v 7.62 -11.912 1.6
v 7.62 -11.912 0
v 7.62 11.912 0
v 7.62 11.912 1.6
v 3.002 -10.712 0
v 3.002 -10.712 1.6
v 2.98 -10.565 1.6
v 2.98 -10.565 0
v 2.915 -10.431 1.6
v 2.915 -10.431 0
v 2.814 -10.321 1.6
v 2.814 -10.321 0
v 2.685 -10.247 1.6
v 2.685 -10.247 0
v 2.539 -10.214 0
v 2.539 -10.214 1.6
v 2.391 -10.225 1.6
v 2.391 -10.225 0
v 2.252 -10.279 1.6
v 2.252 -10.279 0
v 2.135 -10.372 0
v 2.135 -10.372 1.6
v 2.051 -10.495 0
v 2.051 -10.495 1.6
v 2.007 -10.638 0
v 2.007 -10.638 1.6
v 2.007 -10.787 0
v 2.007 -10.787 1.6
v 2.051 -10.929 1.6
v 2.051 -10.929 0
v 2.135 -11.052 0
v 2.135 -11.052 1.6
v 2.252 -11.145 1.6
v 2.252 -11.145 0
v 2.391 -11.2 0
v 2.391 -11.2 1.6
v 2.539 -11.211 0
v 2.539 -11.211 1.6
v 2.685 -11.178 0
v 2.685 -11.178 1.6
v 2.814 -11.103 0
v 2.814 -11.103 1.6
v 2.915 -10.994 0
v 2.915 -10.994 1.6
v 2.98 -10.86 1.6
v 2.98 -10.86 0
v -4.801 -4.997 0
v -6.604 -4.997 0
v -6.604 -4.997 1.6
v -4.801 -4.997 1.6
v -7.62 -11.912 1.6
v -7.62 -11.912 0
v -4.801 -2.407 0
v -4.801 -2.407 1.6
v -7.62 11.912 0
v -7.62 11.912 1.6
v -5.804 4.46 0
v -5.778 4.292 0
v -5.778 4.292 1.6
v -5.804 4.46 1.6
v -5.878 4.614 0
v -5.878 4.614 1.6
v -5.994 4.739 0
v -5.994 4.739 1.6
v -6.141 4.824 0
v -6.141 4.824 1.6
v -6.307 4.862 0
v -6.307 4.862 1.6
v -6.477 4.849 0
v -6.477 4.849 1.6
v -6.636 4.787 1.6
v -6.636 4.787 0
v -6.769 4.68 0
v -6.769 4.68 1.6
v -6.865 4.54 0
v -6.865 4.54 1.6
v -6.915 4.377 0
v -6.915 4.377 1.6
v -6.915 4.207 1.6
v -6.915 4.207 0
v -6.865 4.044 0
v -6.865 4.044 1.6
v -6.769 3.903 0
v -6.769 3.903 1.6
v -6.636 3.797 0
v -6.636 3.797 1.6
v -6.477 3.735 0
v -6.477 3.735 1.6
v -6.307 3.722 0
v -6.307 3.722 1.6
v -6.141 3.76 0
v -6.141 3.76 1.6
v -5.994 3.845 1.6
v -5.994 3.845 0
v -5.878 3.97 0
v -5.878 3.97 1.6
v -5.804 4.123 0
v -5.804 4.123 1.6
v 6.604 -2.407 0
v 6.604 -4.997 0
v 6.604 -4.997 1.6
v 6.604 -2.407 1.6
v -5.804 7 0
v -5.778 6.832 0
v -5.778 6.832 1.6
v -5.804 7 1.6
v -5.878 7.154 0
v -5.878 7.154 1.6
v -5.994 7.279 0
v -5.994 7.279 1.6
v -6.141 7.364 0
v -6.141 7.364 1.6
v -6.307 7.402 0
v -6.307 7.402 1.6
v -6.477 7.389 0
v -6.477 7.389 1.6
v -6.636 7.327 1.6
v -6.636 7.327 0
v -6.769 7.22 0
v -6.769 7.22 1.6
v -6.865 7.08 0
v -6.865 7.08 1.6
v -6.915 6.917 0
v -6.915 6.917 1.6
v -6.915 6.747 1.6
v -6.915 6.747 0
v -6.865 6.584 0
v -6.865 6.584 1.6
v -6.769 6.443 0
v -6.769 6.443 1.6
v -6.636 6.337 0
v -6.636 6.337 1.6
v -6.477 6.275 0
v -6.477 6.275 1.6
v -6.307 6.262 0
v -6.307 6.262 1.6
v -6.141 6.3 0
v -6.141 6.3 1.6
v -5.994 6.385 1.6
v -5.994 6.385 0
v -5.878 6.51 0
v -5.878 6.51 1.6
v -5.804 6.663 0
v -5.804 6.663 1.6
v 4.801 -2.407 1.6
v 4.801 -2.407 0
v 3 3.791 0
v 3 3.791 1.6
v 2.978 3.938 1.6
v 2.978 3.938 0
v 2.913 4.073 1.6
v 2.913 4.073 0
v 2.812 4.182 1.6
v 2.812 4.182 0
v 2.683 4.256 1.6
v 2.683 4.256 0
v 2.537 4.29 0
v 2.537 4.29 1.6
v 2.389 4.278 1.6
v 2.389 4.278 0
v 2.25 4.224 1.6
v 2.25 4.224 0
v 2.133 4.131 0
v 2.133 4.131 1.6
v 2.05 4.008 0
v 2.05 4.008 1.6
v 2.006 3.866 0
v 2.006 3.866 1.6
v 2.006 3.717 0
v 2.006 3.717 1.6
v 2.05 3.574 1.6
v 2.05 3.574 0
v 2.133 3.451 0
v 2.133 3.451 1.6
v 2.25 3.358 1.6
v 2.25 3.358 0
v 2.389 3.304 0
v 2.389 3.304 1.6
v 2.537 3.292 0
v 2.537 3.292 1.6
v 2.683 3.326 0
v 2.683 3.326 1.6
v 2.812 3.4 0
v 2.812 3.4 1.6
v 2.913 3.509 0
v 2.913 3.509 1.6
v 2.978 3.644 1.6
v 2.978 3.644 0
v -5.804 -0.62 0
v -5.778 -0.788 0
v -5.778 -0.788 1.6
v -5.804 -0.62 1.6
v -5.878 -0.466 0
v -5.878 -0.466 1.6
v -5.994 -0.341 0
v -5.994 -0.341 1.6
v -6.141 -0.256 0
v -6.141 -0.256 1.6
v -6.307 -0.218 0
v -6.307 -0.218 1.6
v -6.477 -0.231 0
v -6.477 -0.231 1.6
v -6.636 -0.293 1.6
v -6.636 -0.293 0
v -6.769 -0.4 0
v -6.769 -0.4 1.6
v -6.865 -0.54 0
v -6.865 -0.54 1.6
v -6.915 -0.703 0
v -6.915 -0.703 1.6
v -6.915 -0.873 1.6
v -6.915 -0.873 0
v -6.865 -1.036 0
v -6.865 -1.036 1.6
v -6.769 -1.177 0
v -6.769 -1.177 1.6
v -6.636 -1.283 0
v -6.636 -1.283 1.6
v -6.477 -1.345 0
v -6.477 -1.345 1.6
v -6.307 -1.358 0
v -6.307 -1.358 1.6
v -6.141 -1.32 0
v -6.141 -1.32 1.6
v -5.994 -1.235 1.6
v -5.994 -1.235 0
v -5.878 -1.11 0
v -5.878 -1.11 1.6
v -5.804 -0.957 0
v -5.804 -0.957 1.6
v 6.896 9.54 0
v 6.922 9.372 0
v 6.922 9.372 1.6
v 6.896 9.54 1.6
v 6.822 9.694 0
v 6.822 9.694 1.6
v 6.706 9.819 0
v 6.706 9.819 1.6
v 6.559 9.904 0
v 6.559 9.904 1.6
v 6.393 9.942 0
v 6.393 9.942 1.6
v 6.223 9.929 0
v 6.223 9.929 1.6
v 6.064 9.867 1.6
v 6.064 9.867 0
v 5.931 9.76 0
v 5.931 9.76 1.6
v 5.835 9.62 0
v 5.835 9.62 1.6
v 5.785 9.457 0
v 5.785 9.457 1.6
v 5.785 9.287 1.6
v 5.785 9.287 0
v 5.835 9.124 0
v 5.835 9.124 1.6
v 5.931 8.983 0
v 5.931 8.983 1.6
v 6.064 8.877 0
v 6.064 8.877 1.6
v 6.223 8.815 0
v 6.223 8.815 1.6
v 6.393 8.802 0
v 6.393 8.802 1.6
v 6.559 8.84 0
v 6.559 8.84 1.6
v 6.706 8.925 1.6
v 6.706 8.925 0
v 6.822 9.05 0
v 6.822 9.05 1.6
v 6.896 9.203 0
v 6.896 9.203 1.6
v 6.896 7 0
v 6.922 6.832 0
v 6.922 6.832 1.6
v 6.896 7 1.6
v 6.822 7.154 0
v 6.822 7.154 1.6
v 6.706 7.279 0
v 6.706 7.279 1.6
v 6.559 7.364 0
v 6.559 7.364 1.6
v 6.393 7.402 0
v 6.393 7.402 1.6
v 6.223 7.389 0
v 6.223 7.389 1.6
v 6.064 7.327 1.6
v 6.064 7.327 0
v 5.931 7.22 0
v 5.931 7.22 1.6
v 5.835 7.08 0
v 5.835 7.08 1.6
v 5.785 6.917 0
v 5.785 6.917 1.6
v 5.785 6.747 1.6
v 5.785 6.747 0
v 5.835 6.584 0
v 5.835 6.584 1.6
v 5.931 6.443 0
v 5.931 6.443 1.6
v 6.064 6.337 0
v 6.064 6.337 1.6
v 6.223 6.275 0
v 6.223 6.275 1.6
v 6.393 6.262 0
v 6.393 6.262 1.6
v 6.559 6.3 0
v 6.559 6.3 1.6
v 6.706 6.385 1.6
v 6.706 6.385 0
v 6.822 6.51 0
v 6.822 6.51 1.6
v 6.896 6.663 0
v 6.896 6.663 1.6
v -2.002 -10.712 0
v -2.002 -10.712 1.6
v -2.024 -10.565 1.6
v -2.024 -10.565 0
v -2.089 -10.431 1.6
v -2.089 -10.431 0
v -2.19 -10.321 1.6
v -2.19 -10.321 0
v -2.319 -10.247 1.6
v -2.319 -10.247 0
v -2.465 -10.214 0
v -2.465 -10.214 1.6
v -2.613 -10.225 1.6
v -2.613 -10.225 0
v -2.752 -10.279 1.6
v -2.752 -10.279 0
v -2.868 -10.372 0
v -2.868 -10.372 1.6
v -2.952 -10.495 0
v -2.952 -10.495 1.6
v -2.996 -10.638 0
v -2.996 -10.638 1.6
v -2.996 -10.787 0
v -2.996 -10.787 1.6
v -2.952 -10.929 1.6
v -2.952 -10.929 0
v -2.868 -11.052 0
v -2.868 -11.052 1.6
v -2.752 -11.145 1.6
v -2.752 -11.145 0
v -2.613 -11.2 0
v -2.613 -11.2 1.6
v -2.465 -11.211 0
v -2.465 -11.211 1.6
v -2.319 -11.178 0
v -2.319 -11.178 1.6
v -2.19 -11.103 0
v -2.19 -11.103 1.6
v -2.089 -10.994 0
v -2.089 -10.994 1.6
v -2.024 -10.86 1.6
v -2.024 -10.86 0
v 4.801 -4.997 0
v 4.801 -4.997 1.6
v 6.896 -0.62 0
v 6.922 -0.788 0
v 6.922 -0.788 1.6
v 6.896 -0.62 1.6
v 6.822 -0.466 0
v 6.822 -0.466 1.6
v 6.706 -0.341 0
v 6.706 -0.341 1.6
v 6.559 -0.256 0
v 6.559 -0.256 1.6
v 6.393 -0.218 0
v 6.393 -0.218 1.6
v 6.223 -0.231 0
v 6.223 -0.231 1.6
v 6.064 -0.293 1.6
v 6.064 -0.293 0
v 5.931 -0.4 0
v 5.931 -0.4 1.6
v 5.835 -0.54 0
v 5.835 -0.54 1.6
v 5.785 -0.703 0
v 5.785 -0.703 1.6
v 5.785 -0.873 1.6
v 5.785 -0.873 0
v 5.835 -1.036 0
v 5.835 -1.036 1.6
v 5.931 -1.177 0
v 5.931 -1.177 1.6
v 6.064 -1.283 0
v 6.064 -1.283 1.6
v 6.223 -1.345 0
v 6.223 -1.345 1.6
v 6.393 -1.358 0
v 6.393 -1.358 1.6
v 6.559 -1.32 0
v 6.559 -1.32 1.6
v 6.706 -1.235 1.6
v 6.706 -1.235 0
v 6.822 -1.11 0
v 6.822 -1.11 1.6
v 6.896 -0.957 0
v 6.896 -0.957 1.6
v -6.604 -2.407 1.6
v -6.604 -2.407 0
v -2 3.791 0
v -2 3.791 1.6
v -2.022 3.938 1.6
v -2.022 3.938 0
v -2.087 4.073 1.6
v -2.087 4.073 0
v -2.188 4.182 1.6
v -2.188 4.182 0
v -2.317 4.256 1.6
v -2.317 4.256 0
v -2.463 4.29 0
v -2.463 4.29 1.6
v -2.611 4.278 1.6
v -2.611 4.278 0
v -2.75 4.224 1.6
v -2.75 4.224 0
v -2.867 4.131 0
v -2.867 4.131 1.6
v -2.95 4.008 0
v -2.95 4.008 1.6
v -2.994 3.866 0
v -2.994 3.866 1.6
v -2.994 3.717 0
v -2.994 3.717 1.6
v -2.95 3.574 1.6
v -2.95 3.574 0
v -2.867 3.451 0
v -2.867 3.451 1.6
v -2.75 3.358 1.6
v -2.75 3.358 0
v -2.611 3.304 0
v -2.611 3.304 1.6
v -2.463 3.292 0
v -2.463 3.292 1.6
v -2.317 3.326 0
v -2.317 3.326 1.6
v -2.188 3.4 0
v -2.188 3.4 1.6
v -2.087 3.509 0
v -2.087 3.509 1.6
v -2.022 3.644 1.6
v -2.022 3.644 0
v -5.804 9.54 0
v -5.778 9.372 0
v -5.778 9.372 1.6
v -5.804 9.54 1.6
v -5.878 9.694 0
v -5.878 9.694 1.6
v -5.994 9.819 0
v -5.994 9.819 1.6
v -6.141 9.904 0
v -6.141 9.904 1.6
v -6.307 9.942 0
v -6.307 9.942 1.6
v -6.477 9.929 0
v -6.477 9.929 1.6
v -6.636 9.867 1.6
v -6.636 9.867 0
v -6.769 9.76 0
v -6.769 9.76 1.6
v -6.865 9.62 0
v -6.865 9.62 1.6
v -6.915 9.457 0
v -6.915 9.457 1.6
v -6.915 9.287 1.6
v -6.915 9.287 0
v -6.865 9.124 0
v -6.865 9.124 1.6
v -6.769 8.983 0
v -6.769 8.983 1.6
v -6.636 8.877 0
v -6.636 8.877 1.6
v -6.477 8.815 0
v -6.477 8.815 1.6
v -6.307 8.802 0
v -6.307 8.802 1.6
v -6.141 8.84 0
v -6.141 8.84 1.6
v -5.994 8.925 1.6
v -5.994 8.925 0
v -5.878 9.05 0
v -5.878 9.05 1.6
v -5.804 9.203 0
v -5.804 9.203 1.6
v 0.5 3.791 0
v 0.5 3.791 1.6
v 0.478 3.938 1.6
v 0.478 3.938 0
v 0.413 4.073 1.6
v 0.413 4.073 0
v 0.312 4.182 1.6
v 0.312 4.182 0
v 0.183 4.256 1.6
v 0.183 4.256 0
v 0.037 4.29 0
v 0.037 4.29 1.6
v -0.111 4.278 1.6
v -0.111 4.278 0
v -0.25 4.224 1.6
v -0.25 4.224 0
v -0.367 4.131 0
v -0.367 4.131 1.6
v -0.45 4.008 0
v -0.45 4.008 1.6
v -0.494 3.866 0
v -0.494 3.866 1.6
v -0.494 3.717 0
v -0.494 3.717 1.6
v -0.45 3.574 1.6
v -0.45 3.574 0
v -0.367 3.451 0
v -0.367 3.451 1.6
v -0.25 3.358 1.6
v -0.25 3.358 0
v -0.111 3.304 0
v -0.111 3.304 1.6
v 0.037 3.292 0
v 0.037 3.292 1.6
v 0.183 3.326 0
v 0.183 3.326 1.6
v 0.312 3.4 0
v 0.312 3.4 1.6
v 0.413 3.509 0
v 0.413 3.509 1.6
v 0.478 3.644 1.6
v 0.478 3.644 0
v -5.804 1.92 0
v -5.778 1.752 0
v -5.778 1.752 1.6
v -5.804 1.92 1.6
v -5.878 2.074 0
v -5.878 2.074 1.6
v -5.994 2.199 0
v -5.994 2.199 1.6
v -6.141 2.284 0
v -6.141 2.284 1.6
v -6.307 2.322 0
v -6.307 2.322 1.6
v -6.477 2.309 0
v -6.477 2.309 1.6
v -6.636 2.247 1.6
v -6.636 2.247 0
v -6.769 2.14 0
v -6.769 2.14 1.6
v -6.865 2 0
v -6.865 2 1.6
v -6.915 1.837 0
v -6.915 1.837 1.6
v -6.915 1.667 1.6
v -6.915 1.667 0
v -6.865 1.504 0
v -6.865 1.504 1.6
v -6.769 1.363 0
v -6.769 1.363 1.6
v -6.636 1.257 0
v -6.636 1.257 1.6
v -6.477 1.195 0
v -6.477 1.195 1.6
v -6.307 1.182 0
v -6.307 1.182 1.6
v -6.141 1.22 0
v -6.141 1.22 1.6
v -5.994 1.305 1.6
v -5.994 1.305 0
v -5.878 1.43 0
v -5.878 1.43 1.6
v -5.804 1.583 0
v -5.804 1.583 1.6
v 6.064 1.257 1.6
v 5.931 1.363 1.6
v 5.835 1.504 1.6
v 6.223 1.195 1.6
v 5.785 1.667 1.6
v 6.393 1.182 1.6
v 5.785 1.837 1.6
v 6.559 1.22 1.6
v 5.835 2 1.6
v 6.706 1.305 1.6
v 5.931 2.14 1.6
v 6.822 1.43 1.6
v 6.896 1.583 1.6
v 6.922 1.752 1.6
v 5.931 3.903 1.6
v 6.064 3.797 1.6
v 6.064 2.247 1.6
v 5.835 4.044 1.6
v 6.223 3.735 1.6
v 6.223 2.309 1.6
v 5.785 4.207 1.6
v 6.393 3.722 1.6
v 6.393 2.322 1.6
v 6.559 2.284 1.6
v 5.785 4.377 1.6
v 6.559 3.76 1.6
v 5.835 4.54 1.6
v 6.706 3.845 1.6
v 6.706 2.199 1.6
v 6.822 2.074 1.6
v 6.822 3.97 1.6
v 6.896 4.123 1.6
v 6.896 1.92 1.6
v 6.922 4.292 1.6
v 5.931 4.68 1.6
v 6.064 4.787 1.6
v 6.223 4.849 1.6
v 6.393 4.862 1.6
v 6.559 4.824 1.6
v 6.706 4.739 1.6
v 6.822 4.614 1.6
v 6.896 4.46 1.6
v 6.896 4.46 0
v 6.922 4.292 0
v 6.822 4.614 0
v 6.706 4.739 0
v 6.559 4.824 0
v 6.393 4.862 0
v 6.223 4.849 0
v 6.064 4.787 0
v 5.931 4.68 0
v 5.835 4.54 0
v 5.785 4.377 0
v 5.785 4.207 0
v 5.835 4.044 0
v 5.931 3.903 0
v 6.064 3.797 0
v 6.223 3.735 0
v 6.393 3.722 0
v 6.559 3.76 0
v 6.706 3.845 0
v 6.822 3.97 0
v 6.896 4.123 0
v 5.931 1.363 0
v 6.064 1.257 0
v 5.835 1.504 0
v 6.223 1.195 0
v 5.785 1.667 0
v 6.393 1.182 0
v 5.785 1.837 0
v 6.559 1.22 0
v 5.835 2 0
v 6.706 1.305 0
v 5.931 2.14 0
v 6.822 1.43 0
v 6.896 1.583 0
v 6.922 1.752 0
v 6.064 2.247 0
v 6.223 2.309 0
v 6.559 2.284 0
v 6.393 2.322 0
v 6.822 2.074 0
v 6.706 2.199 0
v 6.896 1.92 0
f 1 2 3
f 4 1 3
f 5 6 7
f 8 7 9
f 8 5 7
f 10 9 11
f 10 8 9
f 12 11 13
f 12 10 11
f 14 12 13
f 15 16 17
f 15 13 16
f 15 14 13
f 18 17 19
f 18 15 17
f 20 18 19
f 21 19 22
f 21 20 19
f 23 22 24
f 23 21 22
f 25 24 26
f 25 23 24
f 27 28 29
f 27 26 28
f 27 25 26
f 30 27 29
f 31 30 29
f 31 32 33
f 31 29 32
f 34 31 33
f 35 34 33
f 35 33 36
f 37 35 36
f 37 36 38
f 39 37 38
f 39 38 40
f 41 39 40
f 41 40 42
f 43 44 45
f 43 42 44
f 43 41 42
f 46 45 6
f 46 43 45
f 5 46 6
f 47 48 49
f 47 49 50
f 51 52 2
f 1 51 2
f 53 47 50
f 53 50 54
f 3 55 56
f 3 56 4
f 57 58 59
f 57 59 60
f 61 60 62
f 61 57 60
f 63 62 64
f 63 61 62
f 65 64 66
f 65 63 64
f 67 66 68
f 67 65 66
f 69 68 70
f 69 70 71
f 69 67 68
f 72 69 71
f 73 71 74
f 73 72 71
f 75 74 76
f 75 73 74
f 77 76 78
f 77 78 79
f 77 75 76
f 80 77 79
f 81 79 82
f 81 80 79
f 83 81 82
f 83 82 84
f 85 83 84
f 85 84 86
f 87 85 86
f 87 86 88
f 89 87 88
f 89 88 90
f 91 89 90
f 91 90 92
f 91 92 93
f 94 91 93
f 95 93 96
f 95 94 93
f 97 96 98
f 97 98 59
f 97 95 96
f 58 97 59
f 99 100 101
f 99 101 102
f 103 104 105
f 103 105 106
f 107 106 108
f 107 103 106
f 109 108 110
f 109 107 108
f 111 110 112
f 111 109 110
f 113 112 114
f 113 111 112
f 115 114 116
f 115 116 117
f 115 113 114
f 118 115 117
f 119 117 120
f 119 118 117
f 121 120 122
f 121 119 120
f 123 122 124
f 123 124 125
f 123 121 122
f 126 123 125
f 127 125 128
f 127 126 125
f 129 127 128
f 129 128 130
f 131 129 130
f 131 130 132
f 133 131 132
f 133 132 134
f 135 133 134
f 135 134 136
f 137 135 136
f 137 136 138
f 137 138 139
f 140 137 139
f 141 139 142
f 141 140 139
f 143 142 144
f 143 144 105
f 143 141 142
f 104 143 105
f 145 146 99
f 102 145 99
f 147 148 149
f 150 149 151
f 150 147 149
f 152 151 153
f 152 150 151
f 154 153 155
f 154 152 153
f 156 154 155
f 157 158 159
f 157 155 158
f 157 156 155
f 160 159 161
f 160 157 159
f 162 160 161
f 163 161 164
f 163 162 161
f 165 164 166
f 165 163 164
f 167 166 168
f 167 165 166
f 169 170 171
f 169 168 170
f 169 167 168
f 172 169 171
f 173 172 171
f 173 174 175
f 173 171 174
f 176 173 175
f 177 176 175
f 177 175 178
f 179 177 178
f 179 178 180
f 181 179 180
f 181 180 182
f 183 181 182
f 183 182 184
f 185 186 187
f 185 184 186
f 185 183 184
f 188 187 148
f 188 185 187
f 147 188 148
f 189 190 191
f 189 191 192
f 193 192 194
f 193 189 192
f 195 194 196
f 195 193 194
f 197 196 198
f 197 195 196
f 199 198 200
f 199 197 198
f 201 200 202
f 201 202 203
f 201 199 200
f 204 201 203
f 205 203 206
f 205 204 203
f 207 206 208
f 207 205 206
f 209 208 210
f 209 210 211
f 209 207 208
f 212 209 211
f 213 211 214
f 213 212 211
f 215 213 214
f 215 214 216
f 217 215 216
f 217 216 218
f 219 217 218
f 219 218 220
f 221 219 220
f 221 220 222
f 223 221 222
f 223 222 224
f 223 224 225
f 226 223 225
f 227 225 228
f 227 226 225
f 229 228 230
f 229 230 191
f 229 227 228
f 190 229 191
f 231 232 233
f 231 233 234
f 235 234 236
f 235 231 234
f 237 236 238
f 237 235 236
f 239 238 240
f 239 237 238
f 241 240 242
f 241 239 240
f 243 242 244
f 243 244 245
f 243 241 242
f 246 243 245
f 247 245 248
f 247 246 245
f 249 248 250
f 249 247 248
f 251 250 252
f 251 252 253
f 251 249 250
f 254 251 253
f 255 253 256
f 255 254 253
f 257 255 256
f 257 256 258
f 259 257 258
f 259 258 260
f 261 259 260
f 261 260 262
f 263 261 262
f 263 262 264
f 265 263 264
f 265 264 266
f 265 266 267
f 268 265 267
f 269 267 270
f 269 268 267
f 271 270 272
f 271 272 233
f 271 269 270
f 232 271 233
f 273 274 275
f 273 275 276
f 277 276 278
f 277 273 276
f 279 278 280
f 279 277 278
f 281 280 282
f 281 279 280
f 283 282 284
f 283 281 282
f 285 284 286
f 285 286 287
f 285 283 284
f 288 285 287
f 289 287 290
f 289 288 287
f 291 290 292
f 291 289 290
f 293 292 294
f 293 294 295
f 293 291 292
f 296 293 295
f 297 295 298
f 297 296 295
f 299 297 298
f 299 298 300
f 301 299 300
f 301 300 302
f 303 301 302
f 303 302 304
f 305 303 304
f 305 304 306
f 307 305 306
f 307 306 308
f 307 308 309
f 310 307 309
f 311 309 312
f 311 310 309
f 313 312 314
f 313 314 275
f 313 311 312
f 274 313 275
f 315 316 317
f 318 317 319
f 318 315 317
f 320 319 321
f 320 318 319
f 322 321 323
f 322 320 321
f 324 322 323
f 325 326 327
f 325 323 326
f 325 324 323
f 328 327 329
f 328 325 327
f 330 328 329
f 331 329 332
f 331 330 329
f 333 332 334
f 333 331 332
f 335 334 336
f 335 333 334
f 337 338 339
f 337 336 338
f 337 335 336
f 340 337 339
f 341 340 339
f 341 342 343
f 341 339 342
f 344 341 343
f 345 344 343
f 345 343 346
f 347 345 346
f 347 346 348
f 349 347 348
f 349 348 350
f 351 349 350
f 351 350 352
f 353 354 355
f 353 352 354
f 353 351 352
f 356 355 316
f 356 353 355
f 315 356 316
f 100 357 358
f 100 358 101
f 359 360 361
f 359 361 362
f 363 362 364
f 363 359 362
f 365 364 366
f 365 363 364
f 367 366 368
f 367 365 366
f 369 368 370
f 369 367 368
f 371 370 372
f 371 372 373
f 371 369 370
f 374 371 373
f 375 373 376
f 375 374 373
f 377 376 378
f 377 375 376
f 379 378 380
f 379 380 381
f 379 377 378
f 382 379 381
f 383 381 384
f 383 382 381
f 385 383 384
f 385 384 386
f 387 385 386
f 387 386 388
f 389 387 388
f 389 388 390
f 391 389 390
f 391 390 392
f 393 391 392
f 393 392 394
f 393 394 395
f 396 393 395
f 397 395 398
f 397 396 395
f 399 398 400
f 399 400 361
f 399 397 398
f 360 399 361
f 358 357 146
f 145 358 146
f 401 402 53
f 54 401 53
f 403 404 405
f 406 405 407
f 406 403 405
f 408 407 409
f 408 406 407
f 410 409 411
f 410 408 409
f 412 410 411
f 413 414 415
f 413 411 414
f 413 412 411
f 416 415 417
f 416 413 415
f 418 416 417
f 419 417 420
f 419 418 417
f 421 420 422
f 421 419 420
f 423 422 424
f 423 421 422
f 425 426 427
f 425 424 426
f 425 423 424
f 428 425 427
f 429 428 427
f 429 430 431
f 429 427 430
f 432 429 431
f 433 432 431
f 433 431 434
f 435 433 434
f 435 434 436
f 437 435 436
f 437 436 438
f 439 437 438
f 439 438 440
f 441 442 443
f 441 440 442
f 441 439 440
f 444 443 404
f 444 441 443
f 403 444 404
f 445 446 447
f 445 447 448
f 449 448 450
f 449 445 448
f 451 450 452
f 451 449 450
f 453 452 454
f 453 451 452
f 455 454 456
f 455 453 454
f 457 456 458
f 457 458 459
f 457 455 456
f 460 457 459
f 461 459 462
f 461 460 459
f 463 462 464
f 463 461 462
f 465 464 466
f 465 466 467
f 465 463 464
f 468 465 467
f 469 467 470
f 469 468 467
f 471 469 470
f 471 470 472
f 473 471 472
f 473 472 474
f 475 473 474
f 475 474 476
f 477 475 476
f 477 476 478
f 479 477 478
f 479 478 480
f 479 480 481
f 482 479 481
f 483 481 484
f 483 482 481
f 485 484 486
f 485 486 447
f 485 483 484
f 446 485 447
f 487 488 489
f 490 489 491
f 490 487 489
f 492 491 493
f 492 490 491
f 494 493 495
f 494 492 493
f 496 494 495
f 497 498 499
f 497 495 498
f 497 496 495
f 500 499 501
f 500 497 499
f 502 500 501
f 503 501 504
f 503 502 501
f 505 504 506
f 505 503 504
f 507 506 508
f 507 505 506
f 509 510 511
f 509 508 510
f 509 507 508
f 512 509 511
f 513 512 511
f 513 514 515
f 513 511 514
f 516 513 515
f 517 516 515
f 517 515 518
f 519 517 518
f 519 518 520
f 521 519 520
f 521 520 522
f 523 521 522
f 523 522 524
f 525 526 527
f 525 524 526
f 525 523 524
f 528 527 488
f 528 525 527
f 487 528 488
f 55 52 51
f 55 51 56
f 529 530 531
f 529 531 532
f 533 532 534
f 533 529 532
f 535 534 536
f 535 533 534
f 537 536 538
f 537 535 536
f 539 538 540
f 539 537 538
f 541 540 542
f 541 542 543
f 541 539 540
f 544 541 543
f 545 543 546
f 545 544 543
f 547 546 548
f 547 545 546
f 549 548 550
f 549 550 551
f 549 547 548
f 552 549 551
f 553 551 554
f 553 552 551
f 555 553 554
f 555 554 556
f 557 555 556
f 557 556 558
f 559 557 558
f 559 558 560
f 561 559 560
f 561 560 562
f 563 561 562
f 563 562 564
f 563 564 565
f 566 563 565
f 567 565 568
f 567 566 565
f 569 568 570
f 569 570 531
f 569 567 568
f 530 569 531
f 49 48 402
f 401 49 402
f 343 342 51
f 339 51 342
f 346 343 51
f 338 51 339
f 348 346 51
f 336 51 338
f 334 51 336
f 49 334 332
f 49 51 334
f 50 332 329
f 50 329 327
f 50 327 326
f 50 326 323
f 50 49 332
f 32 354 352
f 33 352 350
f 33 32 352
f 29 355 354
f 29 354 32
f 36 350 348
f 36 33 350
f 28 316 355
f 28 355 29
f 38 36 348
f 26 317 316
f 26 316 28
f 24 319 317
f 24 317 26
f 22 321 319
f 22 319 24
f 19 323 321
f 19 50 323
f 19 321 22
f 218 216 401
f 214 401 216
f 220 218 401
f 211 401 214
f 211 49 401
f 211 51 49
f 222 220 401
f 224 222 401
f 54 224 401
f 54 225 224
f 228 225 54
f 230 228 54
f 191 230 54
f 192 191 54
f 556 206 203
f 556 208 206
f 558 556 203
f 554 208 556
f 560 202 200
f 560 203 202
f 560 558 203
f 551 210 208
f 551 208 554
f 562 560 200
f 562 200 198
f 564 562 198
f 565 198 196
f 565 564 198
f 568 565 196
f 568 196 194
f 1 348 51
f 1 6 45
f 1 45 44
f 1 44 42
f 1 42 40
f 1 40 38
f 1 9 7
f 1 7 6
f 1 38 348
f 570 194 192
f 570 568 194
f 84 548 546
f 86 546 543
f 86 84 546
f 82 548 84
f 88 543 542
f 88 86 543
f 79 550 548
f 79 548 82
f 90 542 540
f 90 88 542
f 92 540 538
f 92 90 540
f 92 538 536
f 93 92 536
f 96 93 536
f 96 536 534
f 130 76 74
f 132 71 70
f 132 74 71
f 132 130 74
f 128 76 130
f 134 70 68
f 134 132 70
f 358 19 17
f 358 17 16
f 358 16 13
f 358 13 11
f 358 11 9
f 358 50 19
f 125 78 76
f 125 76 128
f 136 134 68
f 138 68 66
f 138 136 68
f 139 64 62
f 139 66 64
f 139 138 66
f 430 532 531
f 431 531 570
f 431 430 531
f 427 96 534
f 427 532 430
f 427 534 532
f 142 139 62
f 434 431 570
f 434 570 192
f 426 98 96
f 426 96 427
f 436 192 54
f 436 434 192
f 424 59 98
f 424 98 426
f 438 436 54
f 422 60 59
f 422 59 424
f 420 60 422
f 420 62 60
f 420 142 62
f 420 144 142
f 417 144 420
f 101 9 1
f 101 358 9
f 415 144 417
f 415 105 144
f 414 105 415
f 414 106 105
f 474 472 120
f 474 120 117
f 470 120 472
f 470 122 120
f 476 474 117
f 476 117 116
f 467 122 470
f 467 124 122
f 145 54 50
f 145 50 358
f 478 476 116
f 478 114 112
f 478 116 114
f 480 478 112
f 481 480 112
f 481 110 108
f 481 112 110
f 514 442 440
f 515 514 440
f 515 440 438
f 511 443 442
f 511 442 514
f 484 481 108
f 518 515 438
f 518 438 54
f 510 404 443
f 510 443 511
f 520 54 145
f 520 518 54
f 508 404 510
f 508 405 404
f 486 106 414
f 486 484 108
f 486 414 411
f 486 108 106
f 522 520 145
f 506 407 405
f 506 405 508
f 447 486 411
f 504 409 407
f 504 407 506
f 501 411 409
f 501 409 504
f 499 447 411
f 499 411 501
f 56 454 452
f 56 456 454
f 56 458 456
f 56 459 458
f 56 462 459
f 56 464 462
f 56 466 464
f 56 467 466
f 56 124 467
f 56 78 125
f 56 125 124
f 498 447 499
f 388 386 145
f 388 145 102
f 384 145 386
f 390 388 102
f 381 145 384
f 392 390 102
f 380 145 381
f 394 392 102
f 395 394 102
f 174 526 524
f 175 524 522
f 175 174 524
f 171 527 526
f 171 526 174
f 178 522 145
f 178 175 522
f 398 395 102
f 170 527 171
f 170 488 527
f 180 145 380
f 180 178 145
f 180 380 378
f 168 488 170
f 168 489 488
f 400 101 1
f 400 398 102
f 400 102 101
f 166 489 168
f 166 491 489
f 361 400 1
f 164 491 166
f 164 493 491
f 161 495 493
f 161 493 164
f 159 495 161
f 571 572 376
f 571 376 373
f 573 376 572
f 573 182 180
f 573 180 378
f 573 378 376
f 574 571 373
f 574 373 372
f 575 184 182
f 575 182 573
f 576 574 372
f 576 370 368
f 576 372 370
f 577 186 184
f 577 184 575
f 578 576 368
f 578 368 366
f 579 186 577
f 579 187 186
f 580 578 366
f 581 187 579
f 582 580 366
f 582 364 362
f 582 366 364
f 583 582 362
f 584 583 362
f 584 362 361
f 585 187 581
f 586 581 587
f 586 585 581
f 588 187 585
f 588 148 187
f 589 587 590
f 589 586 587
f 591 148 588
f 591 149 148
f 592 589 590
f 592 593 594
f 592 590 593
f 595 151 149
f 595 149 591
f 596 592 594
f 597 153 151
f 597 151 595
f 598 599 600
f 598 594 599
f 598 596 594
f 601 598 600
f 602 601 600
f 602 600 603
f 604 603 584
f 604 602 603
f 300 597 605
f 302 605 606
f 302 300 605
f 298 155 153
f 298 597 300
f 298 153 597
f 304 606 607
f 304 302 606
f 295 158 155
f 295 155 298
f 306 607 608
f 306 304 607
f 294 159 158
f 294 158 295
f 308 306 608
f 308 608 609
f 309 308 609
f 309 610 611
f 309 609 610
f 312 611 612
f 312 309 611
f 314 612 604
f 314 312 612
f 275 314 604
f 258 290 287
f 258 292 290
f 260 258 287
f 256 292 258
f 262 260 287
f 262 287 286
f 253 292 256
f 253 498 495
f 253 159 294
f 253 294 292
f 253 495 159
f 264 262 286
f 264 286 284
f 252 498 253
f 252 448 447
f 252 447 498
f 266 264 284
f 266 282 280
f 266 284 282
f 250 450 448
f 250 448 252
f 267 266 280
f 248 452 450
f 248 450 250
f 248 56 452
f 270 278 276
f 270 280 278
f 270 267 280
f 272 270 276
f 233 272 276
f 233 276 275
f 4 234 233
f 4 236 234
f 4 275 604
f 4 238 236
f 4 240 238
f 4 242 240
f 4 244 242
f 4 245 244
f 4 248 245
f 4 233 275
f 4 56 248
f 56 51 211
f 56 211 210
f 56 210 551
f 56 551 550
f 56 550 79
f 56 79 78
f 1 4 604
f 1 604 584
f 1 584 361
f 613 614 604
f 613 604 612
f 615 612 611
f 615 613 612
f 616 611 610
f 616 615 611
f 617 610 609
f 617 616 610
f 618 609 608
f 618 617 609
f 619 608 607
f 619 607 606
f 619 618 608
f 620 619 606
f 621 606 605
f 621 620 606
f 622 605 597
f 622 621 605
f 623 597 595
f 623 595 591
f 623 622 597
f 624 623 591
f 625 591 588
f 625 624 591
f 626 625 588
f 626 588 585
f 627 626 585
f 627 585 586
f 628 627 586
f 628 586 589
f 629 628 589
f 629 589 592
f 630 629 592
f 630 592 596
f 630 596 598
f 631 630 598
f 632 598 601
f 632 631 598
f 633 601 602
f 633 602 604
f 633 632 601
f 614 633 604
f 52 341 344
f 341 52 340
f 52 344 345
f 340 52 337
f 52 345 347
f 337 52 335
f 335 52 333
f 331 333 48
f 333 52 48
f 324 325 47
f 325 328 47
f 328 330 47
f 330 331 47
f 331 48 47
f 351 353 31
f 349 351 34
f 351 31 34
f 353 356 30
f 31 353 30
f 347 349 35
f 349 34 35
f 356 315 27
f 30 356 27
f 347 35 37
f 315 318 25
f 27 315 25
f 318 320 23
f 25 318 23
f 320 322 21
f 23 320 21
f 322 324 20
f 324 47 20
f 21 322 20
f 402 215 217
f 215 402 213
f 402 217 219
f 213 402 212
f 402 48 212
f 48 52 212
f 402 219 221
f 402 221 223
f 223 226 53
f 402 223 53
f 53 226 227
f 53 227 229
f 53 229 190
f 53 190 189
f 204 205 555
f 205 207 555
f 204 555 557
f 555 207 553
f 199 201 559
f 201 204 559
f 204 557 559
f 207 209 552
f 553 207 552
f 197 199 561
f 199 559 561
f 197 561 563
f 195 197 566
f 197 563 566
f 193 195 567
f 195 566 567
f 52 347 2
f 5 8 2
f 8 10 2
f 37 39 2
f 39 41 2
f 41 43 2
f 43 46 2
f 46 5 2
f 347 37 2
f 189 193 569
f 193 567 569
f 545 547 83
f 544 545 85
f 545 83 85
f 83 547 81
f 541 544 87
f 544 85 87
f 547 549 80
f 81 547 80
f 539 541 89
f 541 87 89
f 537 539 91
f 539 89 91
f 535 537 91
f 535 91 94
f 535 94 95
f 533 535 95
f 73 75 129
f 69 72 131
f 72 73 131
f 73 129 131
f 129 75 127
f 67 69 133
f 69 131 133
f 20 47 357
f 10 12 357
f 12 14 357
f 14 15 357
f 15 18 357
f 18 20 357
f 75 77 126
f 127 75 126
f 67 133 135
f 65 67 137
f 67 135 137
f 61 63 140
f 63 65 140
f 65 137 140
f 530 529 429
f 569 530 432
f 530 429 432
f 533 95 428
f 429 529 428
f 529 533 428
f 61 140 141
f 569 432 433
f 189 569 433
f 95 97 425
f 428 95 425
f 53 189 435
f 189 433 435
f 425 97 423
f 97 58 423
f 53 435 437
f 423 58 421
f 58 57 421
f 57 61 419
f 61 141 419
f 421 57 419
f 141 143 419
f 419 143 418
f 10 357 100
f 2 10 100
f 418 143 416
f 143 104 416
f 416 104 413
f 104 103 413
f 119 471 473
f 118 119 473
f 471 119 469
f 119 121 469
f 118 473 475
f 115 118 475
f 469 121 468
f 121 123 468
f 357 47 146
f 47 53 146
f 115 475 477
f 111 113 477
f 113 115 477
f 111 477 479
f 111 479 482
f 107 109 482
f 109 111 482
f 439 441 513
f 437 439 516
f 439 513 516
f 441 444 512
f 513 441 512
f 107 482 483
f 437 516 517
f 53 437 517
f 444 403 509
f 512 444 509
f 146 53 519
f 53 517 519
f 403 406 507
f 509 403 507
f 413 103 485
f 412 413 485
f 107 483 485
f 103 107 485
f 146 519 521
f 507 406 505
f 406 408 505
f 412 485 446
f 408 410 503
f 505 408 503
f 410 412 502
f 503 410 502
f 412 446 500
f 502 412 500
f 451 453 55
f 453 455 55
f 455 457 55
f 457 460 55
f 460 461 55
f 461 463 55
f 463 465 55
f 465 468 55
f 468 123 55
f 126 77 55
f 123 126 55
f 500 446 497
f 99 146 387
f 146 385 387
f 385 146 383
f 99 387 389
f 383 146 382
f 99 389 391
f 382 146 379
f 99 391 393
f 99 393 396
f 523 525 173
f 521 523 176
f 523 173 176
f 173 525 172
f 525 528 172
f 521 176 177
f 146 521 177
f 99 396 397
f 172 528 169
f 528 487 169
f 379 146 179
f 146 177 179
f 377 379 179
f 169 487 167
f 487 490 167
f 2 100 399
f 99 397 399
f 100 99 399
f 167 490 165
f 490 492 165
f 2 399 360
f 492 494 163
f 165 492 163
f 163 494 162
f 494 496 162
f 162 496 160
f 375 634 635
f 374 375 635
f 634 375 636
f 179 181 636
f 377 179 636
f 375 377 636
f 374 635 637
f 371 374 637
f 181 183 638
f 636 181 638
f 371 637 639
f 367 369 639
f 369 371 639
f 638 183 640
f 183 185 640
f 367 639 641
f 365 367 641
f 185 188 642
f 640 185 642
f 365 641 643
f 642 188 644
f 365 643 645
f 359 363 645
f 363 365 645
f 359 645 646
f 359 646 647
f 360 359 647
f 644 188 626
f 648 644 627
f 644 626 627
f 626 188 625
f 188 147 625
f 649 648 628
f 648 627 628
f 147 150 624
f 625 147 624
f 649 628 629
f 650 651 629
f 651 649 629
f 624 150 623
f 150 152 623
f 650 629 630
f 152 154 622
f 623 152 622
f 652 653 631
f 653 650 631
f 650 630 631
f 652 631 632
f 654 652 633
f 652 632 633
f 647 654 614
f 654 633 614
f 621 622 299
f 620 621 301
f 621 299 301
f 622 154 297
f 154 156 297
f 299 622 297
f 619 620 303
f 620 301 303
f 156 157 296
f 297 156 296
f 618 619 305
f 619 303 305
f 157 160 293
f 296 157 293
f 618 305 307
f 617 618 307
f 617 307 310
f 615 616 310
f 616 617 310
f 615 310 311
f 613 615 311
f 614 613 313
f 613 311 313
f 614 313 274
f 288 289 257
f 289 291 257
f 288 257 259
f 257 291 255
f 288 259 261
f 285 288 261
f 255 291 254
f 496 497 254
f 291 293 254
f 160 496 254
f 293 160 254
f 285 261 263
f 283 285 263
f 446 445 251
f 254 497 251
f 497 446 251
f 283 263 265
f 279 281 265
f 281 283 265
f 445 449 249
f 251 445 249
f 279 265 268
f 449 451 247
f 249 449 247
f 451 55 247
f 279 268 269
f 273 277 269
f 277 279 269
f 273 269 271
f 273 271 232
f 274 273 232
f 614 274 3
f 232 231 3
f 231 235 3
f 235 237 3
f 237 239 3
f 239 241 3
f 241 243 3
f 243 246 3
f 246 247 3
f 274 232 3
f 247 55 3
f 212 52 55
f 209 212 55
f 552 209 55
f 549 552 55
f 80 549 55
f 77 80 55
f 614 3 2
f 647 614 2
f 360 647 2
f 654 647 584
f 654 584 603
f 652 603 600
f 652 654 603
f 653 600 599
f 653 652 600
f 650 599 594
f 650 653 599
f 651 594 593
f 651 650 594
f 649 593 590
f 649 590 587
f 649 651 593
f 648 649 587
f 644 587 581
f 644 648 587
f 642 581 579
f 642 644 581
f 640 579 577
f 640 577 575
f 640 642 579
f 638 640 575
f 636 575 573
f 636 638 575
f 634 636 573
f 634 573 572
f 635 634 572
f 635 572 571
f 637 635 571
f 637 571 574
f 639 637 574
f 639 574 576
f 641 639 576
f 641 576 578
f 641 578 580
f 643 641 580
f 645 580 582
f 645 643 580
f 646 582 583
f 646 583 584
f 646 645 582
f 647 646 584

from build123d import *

# Parameters (mm, degrees)
F0_W     = 15.24
F0_H     = 23.82343
F0_R     = 0.5715
F1_DEPTH = 1.6
F2_R     = 0.5
F2_W     = 1.8034
F2_H     = 2.5908
F3_DEPTH = 1.601


with BuildPart() as f1:
    # F0 (on Top) → F1 (new body)
    with BuildSketch(Plane.XY):
        Rectangle(F0_W, F0_H)
        with Locations((-6.35, -0.788285)):
            Circle(F0_R, mode=Mode.SUBTRACT)
        with Locations((6.35, -0.788285)):
            Circle(F0_R, mode=Mode.SUBTRACT)
        with Locations((-6.35, 1.751715)):
            Circle(F0_R, mode=Mode.SUBTRACT)
        with Locations((-6.35, 4.291715)):
            Circle(F0_R, mode=Mode.SUBTRACT)
        with Locations((-6.35, 6.831715)):
            Circle(F0_R, mode=Mode.SUBTRACT)
        with Locations((-6.35, 9.371715)):
            Circle(F0_R, mode=Mode.SUBTRACT)
        with Locations((6.35, 1.751715)):
            Circle(F0_R, mode=Mode.SUBTRACT)
        with Locations((6.35, 4.291715)):
            Circle(F0_R, mode=Mode.SUBTRACT)
        with Locations((6.35, 6.831715)):
            Circle(F0_R, mode=Mode.SUBTRACT)
        with Locations((6.35, 9.371715)):
            Circle(F0_R, mode=Mode.SUBTRACT)
    extrude(amount=F1_DEPTH)

    # F2 (on Top) → F3 (cut, through all)
    with BuildSketch(Plane.XY):
        with Locations((2.5019, -10.712373)):
            Circle(F2_R)
        with Locations((0, 3.791027)):
            Circle(F2_R)
        with Locations((-2.5, 3.791027)):
            Circle(F2_R)
        with Locations((-2.5019, -10.712373)):
            Circle(F2_R)
        with Locations((2.5, 3.791027)):
            Circle(F2_R)
        with Locations((-5.7023, -3.701973)):
            Rectangle(F2_W, F2_H)
        with Locations((5.7023, -3.701973)):
            Rectangle(F2_W, F2_H)
    extrude(amount=F3_DEPTH, mode=Mode.SUBTRACT)


solid = f1.part
